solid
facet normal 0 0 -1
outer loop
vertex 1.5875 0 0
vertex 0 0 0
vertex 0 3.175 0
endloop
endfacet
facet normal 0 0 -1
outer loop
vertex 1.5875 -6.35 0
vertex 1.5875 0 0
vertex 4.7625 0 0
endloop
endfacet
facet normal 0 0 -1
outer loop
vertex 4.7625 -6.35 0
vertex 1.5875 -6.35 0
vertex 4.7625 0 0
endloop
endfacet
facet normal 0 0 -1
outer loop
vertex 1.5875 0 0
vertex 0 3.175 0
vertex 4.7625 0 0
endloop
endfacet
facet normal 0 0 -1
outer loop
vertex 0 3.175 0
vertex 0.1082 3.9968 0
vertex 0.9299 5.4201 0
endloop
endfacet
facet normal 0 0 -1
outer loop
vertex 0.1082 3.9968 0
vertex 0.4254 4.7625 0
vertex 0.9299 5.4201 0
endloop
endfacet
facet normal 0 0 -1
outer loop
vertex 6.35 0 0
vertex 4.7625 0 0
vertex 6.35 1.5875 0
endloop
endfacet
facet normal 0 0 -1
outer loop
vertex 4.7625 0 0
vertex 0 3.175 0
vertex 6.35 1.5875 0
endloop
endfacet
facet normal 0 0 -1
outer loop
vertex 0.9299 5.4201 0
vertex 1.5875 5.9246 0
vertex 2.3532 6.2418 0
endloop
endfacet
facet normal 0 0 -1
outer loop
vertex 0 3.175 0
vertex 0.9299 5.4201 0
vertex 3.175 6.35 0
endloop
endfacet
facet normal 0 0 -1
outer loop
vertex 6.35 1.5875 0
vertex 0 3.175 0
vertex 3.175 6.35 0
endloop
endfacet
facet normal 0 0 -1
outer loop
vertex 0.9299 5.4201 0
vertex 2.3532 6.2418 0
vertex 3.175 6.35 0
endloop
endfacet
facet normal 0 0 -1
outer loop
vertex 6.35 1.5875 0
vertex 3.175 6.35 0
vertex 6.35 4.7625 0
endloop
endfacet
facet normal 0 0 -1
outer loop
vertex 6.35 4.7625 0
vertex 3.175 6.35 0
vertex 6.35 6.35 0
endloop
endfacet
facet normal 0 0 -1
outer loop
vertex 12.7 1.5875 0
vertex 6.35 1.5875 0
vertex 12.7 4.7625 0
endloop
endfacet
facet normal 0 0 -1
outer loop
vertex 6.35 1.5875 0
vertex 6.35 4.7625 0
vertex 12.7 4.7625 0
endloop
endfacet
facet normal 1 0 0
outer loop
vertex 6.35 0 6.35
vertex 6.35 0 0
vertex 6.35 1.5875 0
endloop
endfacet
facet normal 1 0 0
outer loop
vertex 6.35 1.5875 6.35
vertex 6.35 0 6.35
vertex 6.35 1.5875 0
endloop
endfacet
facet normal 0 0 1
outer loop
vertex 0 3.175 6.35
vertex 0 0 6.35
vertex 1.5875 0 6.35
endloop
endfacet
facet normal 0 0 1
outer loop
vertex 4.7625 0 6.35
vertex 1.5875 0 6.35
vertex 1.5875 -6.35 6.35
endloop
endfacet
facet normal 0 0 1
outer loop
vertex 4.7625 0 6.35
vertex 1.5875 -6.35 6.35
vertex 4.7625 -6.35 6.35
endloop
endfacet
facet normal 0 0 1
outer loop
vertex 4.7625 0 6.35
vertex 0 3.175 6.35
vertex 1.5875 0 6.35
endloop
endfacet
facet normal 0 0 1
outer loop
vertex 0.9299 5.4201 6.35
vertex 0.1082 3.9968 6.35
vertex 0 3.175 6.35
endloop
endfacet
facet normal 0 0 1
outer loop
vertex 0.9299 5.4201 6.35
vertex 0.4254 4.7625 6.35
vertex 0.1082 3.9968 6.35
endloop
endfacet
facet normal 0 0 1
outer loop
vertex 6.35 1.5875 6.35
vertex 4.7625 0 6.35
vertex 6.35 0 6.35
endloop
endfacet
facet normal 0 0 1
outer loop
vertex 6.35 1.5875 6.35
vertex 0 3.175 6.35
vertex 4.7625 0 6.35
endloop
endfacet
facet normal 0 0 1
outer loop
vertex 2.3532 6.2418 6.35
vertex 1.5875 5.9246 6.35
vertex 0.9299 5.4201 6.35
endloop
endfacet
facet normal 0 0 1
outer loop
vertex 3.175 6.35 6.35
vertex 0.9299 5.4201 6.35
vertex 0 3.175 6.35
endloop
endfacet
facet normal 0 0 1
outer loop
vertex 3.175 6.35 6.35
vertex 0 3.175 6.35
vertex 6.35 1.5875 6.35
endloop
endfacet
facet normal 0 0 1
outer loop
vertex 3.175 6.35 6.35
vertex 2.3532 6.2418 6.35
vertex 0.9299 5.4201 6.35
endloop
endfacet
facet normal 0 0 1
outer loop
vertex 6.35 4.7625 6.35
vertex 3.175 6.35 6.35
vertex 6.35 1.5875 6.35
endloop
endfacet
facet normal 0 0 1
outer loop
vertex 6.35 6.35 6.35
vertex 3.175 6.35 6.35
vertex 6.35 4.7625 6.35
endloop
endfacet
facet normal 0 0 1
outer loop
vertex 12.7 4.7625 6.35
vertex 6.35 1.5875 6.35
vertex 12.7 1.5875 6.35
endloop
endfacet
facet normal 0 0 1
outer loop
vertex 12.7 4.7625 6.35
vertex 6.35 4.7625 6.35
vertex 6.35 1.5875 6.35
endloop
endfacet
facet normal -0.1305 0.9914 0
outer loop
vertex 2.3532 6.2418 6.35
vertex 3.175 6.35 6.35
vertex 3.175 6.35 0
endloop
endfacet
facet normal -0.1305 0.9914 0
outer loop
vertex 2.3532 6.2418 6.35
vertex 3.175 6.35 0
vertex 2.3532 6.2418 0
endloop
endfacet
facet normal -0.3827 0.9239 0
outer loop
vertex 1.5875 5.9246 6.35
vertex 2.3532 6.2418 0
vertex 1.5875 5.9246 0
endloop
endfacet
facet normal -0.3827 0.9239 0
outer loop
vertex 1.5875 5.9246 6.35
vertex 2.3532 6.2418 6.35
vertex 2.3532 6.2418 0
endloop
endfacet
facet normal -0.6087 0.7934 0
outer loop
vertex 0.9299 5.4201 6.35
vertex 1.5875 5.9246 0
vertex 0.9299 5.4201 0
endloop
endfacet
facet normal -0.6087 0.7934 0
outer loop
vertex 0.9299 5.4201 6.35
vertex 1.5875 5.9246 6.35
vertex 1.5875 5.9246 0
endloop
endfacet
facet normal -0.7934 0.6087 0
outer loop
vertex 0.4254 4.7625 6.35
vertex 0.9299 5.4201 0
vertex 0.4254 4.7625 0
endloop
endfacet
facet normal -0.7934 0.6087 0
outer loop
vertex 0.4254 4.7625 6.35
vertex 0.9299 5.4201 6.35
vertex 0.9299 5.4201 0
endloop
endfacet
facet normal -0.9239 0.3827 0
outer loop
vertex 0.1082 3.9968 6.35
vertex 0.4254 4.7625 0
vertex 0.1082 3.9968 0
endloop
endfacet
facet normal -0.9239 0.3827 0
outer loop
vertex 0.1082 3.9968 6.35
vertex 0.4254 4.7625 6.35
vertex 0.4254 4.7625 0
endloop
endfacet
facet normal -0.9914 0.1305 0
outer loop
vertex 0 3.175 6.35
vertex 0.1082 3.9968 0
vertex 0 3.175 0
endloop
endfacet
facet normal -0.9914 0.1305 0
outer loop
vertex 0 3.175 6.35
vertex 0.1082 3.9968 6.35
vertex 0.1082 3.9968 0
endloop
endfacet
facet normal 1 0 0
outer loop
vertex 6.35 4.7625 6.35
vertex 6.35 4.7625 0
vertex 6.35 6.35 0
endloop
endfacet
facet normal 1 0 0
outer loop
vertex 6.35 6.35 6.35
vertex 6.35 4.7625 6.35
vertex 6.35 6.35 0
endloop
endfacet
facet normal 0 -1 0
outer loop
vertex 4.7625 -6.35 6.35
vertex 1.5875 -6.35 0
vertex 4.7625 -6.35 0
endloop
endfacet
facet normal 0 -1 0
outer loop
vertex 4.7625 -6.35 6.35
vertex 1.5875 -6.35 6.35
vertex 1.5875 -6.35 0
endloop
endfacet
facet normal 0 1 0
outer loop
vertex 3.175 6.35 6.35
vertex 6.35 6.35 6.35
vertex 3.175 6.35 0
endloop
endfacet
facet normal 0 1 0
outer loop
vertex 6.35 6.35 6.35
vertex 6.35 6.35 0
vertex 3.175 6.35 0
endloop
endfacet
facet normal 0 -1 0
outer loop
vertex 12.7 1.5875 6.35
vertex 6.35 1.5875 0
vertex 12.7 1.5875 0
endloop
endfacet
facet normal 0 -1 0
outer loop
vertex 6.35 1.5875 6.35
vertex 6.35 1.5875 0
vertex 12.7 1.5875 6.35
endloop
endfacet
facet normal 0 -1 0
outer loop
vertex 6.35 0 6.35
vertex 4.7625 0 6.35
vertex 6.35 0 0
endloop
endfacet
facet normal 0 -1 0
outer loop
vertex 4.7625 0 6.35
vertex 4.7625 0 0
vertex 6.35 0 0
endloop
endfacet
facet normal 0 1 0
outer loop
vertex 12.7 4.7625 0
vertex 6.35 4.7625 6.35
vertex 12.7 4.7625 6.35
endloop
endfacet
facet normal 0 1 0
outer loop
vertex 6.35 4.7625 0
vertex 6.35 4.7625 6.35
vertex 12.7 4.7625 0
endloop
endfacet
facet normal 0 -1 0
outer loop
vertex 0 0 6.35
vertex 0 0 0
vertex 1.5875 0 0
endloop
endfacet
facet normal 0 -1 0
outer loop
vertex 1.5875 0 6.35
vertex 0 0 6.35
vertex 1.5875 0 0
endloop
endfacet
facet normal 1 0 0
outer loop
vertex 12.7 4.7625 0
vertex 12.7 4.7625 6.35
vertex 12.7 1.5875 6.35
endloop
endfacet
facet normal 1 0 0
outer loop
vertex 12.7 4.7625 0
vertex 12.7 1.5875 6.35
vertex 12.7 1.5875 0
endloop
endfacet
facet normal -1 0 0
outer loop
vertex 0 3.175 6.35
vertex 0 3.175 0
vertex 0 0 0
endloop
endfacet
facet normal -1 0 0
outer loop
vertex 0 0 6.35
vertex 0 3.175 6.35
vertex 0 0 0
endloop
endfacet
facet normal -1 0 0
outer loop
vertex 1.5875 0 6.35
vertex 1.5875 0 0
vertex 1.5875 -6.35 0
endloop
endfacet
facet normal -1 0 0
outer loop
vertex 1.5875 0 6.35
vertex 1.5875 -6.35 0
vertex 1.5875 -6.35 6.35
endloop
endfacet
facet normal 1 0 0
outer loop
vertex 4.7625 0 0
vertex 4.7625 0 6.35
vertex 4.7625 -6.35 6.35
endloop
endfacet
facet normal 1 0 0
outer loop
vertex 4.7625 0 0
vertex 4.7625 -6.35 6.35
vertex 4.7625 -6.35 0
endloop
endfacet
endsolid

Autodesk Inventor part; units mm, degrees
ref_plane "YZ Plane" through (0, 0, 0) normal (1, 0, 0) x (0, 1, 0)
ref_plane "XZ Plane" through (0, 0, 0) normal (0, 1, 0) x (-1, 0, 0)
ref_plane "XY Plane" through (0, 0, 0) normal (0, 0, 1) x (1, 0, 0)
sketch "Sketch1" plane through (0, 0, 0) normal (0, 0, 1) x (1, 0, 0)
  line L0 (0, 0) -> (6.35, 0)
  line L1 (6.35, 0) -> (6.35, 6.35)
  line L2 (6.35, 6.35) -> (0, 6.35)
  line L3 (0, 6.35) -> (0, 0)
  dimension "d0" = 6.35
  dimension "d1" = 6.35
extrude "Extrusion1" add sketch "Sketch1" along normal blind 6.35
sketch "Sketch2" plane through (6.35, 0, 0) normal (1, 0, 0) x (0, 0, -1)
  line L0 (0, 6.35) -> (-6.35, 6.35) projected
  line L1 (-4.7625, 6.35) -> (-1.5875, 6.35)
  line L2 (0, 0) -> (0, 6.35) projected
  line L3 (-6.35, 0) -> (-6.35, 6.35) projected
  line L4 (-6.35, 4.7625) -> (0, 4.7625)
  line L5 (0, 4.7625) -> (0, 1.5875)
  line L6 (0, 1.5875) -> (-6.35, 1.5875)
  line L7 (-6.35, 1.5875) -> (-6.35, 4.7625)
  line L8 (0, 0) -> (-6.35, 0) projected
  dimension "d13" = 3.175
  dimension "d14" = 1.5875
sketch "Sketch3" plane through (0, 0, 0) normal (0, -1, 0) x (1, 0, 0)
  line L0 (6.35, 0) -> (0, 0) projected
  line L1 (1.5875, 6.35) -> (4.7625, 6.35)
  line L2 (4.7625, 6.35) -> (4.7625, 0)
  line L3 (4.7625, 0) -> (1.5875, 0)
  line L4 (1.5875, 0) -> (1.5875, 6.35)
  line L5 (6.35, 0) -> (6.35, 6.35) projected
  line L6 (0, 6.35) -> (6.35, 6.35) projected
  line L7 (0, 0) -> (0, 6.35) projected
  point P0 (6.35, 4.7625)
  dimension "d9" = 3.175
  dimension "d10" = 0
  dimension "d17" = 1.5875
extrude "Extrusion3" add sketch "Sketch3" along normal blind 6.35 contours L0 L4 L1 L2
extrude "Extrusion4" add sketch "Sketch2" along normal blind 6.35 contours L2 L6 L3 L4
fillet "Fillet1" radius 3.175 1 edges at (0, 6.35, 3.175)
properties part number "MonsterHolderSupport3"
